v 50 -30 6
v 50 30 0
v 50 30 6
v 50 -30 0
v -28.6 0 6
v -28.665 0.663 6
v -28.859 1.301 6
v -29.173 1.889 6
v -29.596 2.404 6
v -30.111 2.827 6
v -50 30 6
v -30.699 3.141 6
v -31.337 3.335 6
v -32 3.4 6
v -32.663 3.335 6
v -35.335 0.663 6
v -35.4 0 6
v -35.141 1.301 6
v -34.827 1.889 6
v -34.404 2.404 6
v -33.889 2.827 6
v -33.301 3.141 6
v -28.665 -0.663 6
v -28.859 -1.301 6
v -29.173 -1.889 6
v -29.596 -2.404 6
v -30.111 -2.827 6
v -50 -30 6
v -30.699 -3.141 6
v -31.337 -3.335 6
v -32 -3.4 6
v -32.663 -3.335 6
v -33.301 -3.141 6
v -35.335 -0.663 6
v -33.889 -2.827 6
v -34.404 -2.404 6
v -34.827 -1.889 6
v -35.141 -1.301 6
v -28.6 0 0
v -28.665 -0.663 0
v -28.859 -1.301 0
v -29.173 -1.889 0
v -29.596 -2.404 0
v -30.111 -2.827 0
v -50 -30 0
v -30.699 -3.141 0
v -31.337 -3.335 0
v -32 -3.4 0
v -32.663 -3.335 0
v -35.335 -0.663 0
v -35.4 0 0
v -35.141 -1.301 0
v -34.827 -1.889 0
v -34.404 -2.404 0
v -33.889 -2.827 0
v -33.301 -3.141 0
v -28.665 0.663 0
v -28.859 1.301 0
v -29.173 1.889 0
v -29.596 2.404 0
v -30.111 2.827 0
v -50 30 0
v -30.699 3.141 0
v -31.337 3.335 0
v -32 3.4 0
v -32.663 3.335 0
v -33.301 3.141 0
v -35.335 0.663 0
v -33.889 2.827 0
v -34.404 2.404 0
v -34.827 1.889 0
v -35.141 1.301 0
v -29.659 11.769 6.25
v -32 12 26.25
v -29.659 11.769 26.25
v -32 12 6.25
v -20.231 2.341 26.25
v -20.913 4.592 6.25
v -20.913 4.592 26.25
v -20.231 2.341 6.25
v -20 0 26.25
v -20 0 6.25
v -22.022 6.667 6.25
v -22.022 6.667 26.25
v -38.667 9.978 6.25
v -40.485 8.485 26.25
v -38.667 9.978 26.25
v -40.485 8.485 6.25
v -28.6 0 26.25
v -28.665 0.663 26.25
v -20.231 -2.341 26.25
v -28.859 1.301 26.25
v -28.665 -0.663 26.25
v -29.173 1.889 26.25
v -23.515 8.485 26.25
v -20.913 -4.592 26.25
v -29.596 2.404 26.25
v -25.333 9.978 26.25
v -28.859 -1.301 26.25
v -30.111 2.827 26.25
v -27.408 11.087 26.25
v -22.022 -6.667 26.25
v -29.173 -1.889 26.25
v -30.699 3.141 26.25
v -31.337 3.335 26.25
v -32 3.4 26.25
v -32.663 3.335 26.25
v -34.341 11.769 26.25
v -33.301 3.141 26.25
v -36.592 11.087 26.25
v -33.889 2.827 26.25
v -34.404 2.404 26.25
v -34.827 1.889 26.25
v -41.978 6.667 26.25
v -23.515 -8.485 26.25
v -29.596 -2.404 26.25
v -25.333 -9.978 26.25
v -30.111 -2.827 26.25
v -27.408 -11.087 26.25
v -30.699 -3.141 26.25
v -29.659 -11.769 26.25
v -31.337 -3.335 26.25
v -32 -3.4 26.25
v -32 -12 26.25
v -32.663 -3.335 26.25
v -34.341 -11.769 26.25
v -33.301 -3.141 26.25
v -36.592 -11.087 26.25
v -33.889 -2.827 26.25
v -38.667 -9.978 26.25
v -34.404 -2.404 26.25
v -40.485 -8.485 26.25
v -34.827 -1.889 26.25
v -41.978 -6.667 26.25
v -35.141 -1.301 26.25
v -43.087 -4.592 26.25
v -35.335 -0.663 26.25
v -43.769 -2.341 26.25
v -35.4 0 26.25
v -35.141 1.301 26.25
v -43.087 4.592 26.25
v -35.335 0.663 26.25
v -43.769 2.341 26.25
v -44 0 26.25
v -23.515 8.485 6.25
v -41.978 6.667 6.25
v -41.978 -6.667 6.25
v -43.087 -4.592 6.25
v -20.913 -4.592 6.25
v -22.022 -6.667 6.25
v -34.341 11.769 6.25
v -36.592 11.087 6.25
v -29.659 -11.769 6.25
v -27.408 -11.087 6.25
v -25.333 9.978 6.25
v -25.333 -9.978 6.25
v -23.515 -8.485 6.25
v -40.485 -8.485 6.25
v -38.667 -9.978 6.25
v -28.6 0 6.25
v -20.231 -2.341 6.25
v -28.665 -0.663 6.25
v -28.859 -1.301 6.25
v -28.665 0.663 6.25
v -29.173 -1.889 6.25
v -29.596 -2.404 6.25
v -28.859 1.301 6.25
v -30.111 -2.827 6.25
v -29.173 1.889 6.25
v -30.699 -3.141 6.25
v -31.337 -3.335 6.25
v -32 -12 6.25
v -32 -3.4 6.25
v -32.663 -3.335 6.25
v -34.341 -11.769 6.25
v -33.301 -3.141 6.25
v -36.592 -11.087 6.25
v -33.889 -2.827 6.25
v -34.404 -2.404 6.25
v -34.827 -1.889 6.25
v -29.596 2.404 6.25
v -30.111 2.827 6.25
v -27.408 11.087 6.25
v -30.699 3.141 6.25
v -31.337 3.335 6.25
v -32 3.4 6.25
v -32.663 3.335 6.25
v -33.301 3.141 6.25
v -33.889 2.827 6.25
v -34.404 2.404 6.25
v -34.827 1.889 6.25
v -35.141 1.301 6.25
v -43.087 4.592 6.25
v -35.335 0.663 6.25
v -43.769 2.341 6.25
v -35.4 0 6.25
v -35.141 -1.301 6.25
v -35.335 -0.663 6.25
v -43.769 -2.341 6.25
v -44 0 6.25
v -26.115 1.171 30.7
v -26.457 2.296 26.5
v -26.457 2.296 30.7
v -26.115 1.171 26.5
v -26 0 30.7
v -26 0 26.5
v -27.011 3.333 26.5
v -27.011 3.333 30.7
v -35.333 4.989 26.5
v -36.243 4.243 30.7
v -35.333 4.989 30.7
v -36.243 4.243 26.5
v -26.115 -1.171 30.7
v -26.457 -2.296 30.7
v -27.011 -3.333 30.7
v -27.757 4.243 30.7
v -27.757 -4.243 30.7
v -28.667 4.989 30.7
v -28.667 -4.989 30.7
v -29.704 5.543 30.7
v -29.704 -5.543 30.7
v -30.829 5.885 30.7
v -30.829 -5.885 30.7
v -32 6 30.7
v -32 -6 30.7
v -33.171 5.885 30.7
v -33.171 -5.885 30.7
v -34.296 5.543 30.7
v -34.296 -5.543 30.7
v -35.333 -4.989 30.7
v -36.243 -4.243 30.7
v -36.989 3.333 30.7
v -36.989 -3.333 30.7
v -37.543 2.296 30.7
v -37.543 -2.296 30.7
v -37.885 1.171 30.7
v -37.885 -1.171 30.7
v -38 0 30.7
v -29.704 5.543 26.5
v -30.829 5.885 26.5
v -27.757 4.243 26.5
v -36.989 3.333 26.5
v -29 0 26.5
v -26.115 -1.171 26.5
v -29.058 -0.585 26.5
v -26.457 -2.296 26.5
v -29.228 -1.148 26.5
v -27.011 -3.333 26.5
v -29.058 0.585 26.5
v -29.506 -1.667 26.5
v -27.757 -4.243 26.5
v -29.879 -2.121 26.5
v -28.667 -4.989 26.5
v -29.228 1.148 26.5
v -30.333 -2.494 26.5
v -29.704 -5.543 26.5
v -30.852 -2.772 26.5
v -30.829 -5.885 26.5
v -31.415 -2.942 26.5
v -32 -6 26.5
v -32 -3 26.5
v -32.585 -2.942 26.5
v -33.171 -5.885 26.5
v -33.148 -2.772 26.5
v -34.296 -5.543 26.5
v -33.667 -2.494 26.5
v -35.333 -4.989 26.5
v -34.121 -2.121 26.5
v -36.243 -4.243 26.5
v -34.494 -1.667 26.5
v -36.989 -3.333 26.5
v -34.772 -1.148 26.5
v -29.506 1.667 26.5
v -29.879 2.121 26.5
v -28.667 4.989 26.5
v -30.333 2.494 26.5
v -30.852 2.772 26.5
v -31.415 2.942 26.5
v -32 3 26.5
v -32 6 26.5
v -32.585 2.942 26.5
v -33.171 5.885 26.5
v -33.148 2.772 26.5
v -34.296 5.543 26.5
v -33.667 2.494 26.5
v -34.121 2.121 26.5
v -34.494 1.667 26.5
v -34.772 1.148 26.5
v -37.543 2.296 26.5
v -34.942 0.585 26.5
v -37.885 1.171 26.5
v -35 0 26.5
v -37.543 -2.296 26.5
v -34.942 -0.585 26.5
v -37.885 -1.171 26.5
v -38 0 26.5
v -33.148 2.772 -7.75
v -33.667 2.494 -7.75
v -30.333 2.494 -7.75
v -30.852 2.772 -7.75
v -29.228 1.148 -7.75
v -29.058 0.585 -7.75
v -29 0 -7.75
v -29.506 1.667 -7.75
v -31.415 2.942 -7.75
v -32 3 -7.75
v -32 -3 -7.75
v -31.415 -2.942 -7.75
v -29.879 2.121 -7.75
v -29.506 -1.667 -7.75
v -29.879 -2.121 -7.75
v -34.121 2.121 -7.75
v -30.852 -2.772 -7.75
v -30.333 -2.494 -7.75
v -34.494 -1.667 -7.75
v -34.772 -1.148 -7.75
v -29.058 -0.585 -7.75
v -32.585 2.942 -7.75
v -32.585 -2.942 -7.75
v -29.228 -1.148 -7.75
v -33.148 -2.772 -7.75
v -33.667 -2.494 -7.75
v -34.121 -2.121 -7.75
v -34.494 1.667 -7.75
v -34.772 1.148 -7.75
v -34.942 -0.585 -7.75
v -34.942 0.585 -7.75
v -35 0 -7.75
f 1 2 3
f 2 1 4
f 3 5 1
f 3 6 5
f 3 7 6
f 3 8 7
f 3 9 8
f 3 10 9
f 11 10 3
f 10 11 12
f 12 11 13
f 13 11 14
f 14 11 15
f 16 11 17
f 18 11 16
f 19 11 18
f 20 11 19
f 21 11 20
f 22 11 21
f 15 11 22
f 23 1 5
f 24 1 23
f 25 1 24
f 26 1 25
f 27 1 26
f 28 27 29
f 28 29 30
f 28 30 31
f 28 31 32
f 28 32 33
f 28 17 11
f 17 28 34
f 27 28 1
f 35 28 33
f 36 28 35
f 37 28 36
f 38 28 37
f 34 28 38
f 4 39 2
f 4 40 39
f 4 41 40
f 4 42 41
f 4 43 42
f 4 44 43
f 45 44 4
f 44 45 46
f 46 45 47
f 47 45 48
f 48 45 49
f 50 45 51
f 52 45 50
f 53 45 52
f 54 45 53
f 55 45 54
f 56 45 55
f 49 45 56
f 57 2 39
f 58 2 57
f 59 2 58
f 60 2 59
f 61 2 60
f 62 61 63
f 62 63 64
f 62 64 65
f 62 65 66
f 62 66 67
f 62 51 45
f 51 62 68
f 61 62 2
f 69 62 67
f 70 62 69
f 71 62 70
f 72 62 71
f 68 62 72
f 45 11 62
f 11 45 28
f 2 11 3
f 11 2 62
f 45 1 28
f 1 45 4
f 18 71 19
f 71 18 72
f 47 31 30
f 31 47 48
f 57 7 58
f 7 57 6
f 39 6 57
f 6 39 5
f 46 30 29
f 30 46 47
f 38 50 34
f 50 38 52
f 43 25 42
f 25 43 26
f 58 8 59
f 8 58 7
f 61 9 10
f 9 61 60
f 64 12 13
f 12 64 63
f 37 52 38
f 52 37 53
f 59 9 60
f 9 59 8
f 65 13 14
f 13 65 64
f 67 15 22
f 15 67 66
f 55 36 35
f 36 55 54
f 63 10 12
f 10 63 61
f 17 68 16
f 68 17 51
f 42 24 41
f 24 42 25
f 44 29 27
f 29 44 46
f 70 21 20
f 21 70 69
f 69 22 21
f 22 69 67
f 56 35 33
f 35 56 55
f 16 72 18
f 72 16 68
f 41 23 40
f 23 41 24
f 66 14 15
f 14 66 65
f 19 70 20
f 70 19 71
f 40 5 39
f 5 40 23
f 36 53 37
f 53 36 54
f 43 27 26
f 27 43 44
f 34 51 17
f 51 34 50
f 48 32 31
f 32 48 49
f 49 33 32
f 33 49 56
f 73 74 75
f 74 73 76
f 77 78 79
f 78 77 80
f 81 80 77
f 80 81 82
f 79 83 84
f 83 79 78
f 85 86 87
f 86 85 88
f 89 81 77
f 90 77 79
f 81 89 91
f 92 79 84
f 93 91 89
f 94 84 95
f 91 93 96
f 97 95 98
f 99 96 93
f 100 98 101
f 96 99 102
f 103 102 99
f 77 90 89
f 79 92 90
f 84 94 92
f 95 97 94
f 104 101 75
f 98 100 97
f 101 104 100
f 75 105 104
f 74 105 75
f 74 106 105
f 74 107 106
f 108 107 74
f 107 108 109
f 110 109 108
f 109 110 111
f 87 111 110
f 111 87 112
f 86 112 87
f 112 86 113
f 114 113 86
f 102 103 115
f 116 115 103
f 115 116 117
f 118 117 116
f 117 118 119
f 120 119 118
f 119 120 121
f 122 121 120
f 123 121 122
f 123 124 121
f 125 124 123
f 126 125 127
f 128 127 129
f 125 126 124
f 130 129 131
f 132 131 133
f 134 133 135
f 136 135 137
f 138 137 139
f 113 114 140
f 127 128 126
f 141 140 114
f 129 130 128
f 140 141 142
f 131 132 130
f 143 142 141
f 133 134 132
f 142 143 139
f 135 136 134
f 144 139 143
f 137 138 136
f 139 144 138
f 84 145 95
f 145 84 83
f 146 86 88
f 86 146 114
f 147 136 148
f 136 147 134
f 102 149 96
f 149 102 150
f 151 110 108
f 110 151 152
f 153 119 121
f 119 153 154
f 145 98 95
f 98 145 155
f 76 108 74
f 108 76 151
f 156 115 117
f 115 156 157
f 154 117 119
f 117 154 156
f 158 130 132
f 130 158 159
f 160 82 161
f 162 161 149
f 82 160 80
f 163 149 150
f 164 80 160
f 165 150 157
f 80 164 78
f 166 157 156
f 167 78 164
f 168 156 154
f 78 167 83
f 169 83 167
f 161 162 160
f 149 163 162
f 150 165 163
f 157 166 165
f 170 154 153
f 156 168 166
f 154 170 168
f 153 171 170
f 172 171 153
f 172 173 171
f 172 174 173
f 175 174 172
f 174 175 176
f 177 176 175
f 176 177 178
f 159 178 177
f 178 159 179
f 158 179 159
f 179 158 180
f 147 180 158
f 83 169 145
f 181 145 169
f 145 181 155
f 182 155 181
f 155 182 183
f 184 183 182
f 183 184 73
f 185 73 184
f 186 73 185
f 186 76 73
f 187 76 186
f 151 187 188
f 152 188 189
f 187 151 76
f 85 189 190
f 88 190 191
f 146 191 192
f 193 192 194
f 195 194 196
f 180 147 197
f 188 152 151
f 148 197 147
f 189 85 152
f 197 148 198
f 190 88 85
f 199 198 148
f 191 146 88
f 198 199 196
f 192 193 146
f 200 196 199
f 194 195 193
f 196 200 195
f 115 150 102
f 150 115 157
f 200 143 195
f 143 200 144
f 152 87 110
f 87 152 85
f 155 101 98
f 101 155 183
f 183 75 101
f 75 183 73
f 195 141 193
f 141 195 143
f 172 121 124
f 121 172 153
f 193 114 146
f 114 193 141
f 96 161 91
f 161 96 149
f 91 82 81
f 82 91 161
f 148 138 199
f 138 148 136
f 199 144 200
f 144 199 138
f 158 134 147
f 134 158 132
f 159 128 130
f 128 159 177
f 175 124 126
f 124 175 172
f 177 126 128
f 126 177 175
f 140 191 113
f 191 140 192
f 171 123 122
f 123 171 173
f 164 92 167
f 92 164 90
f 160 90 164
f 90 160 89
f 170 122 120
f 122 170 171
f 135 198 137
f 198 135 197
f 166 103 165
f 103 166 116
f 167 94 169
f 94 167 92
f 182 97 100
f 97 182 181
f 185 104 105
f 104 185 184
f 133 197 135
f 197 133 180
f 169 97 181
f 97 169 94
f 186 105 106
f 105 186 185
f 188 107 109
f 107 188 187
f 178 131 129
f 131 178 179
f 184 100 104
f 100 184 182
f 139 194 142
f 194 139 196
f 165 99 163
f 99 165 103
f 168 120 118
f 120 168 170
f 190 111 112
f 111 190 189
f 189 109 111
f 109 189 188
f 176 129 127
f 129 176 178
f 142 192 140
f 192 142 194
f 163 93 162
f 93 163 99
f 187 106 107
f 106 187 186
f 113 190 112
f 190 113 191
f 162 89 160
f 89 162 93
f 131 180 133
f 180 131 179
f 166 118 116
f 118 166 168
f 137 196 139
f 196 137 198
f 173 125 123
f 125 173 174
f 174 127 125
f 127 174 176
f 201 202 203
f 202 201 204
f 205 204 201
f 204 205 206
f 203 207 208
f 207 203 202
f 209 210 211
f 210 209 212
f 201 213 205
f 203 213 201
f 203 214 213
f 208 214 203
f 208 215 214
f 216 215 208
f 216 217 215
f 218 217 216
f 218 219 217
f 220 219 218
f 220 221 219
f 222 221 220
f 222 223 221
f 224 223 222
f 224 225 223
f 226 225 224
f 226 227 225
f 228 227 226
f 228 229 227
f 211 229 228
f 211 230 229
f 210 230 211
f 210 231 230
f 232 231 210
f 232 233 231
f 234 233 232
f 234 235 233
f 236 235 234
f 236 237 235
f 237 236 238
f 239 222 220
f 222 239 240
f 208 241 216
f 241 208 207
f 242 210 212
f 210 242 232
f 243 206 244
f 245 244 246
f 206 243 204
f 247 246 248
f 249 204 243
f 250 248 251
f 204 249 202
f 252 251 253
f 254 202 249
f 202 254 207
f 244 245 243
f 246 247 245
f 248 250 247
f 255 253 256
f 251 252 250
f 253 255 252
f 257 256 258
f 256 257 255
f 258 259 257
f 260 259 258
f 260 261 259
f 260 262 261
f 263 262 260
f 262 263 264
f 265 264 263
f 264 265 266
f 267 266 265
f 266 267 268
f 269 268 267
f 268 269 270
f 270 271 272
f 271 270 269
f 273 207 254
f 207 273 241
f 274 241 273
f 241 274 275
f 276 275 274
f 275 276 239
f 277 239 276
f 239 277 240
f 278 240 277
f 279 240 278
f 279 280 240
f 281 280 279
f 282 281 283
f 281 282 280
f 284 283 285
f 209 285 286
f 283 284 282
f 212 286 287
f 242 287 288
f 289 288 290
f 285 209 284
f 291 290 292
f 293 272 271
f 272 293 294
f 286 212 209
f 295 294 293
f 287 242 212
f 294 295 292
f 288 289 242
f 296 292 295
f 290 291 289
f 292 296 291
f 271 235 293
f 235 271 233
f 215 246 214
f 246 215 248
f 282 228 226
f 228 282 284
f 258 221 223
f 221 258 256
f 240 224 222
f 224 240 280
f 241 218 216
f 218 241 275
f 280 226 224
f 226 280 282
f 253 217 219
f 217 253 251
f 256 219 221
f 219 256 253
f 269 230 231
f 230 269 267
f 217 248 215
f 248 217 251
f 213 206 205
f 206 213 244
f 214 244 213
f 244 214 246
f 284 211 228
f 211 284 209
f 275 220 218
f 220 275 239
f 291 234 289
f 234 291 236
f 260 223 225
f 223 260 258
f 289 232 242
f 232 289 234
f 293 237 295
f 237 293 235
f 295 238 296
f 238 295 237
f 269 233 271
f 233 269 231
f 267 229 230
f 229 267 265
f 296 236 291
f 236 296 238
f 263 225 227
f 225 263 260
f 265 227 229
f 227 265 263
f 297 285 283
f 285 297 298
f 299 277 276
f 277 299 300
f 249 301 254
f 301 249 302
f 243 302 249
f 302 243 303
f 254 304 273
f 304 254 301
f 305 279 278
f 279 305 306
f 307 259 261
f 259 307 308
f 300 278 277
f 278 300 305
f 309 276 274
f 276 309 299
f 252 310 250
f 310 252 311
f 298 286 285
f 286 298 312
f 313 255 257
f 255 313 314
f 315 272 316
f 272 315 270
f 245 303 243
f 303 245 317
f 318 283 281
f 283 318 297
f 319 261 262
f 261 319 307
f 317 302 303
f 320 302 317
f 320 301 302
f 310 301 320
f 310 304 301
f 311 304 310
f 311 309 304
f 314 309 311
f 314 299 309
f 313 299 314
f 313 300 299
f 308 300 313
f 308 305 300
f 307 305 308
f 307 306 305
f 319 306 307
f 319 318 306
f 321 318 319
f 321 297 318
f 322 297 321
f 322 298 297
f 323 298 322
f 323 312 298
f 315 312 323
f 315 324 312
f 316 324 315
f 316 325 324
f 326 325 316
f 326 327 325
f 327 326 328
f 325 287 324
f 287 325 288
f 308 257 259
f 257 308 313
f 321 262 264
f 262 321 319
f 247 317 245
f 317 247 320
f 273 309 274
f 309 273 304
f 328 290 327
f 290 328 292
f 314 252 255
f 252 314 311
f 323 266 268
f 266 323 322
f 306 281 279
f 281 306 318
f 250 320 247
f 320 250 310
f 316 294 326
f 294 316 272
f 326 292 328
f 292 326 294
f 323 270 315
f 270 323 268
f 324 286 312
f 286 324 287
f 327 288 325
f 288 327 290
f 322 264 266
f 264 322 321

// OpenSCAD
$fn = 32;

// ------------------------------------------------------------------------
// Standoff columns: 1 d24 standoffs, bolts d6
// Every part is its own module, assembly() places them once.
// ------------------------------------------------------------------------

// --- part 1 ---
module base_plate() {
  difference() {
    translate([-50, -30, 0]) cube([100, 60, 6]);
    translate([-32, 0, -1]) cylinder(h = 8, d = 6.8);
  }
}

// --- part 2 ---
module spacer() {
  difference() {
      translate([0, 0, 0]) cylinder(h = 20, d = 24);
      translate([0, 0, -1]) cylinder(h = 22, d = 6.8);
    }
}

// --- part 3 ---
module bolt() {
  cylinder(h = 4.2, d = 12);
  translate([0, 0, -34.25]) cylinder(h = 34.25, d = 6);
}

// --- assembly ---
module assembly() {
  translate([0, 0, 0]) rotate([0, 0, 0]) base_plate();
  translate([-32, 0, 6.25]) rotate([0, 0, 0]) spacer();
  translate([-32, 0, 26.5]) rotate([0, 0, 0]) bolt();
}

assembly();
